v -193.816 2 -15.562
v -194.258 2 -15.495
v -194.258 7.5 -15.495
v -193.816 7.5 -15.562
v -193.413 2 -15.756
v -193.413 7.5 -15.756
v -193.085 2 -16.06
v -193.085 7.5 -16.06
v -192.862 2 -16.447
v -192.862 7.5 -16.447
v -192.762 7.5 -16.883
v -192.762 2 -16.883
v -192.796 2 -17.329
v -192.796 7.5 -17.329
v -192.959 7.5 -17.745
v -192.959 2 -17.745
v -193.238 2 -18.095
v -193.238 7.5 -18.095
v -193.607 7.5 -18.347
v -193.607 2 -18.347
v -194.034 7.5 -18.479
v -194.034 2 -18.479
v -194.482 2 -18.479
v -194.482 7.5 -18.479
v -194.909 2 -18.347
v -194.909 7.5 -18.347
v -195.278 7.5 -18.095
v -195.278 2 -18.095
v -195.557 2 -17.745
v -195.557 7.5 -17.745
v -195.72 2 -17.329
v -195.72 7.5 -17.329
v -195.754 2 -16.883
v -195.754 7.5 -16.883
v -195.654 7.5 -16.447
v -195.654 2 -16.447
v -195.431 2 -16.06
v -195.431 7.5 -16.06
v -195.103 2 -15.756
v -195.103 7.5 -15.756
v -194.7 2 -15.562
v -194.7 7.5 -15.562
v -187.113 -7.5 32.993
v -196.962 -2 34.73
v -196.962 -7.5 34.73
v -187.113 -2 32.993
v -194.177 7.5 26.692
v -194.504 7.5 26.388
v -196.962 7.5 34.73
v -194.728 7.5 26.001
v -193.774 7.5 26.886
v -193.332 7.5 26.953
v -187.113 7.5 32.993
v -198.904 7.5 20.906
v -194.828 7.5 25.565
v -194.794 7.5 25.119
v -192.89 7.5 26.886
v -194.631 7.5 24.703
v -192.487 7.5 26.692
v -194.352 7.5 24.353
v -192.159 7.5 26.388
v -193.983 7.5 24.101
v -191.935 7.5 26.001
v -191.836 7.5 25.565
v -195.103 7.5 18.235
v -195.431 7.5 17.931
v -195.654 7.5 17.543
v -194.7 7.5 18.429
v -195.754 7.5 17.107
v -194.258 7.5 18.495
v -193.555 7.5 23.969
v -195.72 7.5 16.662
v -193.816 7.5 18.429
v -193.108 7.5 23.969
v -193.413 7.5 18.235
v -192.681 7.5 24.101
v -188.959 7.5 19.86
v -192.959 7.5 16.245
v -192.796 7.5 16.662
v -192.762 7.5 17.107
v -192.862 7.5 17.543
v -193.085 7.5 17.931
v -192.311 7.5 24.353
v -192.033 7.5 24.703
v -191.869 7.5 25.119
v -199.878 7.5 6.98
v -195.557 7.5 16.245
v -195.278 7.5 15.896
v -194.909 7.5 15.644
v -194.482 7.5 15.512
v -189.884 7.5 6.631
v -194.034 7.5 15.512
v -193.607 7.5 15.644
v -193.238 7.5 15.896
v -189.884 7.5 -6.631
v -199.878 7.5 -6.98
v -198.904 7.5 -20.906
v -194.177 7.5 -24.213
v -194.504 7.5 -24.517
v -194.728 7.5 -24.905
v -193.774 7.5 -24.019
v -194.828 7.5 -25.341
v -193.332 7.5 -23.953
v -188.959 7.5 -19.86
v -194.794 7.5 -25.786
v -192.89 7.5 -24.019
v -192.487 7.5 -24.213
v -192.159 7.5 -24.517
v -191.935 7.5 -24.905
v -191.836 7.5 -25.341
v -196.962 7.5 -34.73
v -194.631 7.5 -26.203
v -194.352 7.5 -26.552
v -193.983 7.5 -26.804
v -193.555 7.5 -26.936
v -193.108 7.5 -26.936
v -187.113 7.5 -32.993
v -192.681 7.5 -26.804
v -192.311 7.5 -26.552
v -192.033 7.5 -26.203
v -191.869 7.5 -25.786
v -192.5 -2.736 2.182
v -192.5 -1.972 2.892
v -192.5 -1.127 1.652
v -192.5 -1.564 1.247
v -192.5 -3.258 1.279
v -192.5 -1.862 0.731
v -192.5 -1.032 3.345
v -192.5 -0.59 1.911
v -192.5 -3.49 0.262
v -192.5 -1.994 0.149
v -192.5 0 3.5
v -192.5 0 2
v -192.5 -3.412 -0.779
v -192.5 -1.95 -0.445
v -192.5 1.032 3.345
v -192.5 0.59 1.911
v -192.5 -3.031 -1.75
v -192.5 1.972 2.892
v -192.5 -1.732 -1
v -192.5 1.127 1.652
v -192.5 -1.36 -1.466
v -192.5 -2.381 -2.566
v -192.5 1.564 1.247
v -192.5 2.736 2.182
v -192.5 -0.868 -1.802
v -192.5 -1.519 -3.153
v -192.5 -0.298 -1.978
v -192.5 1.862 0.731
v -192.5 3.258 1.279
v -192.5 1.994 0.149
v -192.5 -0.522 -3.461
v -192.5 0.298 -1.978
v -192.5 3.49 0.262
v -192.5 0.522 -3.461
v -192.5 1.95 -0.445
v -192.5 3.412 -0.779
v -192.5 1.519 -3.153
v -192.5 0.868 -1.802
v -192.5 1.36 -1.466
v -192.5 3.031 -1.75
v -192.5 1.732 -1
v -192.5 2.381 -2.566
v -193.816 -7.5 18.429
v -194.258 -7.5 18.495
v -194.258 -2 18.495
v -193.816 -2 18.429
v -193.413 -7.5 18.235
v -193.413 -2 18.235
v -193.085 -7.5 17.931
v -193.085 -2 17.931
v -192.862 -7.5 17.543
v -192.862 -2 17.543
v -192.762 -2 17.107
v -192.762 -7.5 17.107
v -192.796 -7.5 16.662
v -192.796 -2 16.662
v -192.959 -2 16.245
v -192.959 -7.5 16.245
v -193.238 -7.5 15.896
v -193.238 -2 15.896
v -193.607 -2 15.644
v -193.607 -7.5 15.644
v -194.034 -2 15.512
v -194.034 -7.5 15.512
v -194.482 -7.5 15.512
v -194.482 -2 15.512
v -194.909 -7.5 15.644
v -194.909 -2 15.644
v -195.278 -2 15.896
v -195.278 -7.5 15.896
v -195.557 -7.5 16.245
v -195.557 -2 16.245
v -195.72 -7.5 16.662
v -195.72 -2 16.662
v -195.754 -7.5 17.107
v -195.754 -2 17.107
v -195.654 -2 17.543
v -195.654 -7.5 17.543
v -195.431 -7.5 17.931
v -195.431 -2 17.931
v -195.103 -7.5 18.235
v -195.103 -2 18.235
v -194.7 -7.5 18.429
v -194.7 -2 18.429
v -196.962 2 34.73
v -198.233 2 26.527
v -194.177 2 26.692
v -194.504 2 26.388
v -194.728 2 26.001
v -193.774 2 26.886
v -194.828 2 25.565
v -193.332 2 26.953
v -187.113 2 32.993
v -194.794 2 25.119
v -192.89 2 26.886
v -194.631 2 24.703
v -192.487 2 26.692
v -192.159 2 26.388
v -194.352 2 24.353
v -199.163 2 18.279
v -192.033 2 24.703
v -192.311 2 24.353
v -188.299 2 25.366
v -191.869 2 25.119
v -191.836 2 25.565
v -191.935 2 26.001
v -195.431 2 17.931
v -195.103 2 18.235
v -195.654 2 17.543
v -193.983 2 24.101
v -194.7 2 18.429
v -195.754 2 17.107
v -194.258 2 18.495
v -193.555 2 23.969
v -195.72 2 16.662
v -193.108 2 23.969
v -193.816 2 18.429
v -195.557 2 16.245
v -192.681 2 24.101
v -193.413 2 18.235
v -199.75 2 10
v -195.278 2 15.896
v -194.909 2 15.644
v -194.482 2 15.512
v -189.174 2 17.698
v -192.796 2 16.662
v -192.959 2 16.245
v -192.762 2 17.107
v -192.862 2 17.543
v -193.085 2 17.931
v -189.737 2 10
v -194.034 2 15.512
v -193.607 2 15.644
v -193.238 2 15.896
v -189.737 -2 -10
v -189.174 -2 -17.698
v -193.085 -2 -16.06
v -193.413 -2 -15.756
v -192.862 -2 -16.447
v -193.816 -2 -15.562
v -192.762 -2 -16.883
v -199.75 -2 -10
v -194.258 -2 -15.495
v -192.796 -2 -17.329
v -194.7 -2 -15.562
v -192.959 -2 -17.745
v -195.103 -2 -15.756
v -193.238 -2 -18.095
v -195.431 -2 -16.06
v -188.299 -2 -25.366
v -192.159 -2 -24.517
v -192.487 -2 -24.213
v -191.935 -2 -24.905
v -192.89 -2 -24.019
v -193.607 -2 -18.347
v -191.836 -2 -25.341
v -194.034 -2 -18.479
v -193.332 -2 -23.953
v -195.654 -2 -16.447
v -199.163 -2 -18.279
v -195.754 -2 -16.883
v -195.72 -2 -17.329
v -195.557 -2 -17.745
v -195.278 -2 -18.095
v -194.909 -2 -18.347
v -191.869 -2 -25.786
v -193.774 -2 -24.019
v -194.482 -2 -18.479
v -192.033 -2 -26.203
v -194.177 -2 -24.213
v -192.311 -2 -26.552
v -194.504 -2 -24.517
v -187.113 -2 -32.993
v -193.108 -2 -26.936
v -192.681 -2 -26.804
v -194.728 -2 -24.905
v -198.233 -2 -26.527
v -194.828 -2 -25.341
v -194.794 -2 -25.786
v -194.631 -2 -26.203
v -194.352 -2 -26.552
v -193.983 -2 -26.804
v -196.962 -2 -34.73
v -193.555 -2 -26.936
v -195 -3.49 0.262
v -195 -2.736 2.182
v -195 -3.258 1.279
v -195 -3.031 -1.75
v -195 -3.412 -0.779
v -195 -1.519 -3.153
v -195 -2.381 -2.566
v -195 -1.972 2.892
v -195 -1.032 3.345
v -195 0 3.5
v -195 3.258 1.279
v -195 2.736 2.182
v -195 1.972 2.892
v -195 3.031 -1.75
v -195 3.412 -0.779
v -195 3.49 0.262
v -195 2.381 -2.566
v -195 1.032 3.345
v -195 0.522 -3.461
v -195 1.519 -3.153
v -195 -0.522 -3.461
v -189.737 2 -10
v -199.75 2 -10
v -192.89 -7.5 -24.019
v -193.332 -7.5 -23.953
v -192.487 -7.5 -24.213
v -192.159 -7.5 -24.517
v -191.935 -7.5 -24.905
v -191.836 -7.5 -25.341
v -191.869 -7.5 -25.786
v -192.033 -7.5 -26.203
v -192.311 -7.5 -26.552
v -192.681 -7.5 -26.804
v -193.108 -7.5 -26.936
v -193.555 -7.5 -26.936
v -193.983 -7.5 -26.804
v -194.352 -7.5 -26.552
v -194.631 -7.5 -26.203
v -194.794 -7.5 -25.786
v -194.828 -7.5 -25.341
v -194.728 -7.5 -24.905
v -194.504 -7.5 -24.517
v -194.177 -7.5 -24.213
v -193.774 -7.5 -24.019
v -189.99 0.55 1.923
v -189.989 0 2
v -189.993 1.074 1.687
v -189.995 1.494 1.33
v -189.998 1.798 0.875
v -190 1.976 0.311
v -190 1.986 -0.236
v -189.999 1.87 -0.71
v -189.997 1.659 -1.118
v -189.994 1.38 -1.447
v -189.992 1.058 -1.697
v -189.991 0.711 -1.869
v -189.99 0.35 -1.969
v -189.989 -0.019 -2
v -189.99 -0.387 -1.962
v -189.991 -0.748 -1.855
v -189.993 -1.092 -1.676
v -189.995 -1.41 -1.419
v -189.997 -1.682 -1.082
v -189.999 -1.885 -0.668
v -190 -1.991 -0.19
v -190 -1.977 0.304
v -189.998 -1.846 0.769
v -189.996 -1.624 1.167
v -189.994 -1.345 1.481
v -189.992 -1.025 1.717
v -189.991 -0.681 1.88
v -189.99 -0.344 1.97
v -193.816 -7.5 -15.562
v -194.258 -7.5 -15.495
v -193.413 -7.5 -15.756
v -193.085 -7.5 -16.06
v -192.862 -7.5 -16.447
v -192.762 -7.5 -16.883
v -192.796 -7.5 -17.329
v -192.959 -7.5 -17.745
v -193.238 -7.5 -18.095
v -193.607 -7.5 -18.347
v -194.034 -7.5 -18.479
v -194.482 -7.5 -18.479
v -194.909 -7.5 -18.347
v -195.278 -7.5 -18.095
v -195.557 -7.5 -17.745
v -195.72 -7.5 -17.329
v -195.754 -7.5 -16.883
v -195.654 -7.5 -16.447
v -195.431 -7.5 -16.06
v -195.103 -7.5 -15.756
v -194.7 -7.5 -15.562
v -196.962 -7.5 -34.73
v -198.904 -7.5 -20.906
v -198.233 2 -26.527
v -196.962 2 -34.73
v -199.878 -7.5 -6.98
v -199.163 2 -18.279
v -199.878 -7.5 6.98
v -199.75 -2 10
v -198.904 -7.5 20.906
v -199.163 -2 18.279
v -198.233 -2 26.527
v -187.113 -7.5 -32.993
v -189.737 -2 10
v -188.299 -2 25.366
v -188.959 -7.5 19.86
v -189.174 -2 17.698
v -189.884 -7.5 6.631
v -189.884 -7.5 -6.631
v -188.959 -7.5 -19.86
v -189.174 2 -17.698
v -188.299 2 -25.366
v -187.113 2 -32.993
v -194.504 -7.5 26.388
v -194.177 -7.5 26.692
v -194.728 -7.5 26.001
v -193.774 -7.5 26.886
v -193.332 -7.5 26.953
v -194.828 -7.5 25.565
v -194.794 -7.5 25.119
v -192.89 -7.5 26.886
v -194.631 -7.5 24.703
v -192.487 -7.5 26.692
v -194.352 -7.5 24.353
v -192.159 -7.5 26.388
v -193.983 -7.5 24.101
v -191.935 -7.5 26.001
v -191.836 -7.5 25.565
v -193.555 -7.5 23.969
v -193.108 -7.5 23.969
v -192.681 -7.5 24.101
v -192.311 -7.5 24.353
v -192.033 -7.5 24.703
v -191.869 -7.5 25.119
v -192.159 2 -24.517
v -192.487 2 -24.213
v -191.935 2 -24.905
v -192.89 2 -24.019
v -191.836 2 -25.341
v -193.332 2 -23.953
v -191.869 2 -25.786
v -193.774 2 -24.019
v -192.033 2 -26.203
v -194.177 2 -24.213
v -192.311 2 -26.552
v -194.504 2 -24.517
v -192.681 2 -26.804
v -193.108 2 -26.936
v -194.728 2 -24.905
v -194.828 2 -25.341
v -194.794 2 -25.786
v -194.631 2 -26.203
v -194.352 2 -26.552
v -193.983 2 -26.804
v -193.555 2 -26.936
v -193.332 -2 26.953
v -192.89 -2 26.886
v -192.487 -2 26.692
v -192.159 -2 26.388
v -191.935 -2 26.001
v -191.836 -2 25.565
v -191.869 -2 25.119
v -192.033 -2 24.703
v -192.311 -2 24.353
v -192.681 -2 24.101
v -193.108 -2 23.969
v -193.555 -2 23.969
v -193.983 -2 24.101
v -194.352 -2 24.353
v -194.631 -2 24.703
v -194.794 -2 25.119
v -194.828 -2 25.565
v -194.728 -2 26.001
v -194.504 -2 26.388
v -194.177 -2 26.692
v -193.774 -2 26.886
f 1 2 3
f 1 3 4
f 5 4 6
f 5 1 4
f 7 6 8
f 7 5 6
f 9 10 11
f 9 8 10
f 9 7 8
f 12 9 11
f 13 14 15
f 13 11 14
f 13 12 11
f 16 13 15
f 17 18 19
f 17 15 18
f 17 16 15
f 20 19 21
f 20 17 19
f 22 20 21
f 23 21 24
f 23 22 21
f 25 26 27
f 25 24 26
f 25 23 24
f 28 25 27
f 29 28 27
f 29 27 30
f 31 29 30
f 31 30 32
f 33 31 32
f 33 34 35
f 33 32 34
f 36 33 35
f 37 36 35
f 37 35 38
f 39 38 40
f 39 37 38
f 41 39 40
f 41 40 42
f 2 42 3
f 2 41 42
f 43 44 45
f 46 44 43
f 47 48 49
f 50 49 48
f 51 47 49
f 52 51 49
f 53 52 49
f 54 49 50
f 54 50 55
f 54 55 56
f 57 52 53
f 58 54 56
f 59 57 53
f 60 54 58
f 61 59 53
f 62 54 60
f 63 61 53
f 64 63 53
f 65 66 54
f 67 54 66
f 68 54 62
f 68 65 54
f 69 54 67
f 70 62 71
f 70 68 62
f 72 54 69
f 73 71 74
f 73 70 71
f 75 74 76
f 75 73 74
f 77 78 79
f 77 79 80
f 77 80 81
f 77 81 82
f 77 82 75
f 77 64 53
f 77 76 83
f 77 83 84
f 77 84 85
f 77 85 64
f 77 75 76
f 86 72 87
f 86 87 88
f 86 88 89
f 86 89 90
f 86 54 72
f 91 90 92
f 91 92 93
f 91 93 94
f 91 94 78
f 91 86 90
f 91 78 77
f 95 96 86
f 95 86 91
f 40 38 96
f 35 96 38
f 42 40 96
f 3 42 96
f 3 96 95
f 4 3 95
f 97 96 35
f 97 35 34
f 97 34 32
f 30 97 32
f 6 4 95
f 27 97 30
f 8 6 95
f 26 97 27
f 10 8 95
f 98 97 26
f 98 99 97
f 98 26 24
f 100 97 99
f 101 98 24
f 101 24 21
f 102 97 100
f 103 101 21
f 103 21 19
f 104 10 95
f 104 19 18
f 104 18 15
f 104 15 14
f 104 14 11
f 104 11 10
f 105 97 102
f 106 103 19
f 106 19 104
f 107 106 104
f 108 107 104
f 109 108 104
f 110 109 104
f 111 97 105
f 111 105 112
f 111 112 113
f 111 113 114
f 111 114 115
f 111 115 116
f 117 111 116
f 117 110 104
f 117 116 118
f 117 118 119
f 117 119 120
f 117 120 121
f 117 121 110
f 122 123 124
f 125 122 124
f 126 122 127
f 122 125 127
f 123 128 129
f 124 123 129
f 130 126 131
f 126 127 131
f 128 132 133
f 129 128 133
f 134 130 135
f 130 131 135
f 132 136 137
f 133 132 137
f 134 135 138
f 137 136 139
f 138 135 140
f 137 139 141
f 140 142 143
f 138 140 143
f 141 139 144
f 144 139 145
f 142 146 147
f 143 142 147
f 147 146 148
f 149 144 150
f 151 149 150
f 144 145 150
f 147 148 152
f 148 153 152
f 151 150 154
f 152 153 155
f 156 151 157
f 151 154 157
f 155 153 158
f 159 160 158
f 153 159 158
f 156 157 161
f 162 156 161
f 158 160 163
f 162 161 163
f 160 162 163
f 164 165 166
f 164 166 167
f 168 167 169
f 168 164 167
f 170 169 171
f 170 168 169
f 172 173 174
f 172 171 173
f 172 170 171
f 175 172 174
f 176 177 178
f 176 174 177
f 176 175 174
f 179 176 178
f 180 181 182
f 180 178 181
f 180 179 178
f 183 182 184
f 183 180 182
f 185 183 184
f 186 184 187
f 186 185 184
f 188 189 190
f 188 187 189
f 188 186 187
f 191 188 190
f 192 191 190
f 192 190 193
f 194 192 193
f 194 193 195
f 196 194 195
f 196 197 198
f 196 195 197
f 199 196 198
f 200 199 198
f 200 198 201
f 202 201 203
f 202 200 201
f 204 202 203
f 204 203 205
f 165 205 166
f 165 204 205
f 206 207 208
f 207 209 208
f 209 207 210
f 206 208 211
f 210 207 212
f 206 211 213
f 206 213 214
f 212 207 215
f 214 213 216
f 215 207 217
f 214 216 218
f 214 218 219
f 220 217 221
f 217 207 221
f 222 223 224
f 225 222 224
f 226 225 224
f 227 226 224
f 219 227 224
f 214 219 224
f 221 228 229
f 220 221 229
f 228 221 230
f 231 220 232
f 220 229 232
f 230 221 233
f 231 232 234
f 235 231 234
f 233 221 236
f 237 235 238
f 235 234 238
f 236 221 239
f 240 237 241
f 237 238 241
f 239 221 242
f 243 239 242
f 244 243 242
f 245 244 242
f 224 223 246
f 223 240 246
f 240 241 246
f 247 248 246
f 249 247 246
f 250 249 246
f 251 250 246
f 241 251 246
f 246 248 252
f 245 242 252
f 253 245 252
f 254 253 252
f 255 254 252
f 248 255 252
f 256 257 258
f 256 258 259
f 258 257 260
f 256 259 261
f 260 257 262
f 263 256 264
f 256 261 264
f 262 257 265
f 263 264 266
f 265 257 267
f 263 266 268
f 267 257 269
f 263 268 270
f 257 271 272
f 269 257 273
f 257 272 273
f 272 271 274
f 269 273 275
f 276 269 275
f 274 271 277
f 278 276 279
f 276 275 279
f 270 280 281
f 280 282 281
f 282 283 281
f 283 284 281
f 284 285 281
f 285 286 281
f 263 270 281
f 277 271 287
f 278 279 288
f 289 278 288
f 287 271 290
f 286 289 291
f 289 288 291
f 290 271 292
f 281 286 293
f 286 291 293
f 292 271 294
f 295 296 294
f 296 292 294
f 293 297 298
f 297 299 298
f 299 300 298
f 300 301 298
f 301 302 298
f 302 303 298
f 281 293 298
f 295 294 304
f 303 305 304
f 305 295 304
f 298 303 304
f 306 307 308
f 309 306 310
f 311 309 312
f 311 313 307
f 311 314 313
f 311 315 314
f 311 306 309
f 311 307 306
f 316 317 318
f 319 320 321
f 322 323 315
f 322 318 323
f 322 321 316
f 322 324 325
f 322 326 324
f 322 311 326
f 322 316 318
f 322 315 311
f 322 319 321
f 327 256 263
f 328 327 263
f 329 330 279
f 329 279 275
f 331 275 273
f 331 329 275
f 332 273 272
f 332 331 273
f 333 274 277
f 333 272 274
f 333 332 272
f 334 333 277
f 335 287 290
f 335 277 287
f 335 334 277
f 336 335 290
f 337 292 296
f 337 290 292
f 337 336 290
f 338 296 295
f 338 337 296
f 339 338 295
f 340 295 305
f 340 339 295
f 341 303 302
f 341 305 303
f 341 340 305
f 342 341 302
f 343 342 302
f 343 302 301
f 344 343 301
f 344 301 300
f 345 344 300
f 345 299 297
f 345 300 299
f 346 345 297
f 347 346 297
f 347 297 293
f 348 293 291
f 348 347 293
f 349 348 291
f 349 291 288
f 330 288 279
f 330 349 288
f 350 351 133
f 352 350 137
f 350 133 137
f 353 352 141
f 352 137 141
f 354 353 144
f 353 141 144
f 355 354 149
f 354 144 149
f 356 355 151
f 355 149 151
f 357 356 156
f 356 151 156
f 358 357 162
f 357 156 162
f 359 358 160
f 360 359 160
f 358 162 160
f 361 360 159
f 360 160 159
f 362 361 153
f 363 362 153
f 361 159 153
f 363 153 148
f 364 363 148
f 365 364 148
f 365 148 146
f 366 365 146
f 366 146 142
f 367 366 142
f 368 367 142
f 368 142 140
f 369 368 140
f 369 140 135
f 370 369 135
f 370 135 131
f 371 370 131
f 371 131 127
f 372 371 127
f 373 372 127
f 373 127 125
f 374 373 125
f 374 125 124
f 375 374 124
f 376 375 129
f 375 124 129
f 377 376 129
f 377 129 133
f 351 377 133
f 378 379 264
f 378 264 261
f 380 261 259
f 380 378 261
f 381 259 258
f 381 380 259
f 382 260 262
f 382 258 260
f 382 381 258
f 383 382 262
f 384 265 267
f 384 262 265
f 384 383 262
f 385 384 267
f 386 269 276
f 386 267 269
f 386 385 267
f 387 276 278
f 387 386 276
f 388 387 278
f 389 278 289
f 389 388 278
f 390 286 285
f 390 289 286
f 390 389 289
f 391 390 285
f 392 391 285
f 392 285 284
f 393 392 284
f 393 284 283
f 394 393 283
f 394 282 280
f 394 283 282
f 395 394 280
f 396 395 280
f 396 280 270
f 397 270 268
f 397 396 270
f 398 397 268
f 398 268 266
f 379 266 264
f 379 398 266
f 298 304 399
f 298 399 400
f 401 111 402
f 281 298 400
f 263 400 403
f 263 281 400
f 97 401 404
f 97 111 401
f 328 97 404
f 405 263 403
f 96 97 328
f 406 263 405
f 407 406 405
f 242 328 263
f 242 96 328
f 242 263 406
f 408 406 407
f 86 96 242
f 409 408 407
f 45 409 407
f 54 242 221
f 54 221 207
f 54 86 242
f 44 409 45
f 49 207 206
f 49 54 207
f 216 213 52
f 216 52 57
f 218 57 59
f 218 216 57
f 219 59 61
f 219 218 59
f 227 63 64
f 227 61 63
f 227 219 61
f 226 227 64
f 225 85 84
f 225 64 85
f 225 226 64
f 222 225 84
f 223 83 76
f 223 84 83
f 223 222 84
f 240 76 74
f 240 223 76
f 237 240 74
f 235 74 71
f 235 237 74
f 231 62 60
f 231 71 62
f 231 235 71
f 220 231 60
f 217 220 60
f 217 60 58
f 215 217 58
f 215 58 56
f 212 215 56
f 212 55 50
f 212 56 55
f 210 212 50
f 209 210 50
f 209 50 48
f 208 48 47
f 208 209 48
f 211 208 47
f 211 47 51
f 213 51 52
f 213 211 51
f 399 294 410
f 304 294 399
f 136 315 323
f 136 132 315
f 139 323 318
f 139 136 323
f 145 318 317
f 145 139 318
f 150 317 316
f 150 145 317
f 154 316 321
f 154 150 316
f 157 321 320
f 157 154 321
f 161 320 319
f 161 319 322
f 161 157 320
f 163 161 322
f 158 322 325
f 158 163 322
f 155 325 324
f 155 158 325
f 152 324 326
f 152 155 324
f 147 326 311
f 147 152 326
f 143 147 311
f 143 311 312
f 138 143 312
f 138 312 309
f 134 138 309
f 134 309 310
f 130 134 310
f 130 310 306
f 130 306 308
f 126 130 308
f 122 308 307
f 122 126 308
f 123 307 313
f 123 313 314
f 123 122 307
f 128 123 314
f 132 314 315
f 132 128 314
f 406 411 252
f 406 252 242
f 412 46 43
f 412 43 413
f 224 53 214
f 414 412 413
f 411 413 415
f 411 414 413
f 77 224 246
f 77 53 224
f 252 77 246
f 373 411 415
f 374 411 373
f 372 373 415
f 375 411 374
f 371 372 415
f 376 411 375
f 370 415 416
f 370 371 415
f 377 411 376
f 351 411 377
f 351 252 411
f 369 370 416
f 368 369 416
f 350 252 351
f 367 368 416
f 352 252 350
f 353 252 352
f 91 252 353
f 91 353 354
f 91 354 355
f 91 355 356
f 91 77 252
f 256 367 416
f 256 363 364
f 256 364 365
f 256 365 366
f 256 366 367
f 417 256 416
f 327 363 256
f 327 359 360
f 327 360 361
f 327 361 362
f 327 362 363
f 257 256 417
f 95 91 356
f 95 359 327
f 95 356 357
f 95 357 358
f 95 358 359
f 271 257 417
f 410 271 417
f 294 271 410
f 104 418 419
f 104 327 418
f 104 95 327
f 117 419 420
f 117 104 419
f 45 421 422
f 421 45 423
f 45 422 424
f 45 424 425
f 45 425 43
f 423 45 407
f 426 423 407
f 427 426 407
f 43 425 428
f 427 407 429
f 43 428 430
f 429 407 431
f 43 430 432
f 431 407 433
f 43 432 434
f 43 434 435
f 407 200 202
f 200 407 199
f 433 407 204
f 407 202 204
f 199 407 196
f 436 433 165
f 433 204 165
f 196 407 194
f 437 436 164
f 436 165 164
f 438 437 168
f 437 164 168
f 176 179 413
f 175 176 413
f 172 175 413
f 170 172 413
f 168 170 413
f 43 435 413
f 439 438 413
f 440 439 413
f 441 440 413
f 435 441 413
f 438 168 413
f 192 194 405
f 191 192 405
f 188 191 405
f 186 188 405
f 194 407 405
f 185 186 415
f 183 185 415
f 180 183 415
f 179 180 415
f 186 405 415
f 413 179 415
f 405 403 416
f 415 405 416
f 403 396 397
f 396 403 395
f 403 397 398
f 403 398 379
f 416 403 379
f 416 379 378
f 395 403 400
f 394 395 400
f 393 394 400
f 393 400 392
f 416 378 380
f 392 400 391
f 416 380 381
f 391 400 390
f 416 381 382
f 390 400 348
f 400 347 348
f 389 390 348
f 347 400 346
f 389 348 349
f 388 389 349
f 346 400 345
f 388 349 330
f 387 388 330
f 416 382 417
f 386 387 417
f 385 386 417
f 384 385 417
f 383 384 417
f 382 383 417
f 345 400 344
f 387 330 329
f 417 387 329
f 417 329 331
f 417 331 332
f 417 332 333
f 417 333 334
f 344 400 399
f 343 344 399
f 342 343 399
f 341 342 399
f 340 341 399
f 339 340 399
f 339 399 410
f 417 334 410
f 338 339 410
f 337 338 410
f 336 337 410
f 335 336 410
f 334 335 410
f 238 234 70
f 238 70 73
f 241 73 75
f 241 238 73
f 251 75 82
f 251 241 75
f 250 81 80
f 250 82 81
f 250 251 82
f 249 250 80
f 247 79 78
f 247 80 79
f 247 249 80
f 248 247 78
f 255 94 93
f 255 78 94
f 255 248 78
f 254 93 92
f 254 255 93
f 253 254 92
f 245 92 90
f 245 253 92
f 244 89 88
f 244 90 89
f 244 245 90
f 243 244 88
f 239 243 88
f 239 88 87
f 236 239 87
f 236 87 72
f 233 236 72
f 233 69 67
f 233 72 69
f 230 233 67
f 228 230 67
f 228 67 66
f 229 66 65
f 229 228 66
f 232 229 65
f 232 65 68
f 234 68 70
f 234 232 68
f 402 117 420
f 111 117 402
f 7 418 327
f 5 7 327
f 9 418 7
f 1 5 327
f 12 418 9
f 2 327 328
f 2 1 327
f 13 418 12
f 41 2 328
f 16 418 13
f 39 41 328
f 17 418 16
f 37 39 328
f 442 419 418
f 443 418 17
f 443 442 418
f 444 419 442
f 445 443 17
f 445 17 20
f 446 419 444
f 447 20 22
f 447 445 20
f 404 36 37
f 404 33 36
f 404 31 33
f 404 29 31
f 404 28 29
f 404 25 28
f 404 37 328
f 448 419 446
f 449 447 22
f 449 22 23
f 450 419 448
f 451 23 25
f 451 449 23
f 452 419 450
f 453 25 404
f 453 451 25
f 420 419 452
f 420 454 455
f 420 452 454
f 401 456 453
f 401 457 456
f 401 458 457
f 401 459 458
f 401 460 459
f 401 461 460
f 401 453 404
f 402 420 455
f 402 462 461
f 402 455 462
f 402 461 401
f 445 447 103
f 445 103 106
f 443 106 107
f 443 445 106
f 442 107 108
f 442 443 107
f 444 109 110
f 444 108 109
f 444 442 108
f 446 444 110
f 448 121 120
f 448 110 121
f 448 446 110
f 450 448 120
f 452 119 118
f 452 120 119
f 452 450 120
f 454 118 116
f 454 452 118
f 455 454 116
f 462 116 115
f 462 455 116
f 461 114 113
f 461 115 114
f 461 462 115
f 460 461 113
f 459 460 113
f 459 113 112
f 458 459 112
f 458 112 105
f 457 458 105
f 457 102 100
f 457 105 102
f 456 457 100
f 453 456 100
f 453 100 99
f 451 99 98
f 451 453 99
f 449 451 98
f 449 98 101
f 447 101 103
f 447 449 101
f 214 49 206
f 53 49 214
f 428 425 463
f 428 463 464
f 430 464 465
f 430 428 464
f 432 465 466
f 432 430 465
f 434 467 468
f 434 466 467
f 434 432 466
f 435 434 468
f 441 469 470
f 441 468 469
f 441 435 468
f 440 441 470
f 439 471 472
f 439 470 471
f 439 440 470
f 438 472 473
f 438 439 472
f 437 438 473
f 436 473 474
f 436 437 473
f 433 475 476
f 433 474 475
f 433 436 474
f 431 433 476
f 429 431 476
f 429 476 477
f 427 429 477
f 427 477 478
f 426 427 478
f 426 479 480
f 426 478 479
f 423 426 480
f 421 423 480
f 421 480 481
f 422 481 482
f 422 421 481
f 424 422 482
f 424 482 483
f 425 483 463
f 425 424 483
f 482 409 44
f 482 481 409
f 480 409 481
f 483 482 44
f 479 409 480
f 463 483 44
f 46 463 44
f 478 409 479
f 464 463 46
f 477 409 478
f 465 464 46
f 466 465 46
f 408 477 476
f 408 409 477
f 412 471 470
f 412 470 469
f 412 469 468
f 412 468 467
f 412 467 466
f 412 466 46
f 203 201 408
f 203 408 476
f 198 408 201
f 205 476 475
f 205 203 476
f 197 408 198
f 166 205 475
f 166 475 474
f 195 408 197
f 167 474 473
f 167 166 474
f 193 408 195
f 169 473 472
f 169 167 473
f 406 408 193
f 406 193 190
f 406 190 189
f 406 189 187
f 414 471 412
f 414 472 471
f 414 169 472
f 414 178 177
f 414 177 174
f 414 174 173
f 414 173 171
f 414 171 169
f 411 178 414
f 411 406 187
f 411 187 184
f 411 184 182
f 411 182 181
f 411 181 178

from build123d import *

# Parameters (mm, degrees)
BASE_DEPTH            = 7.5
MOUNT_START           = -2
MOUNT_DEPTH           = 4
MOUNT_HOLE_DEPTH      = 204.131478566
MOUNT_HOLE_DEPTH_BACK = 204.131478566
SKETCH12_R            = 1.5
SKETCH14_R            = 2
SHAFT_HOLE_DEPTH      = 37.394984425
SKETCH13_W            = 2.5
SKETCH13_H            = 3.5


with BuildPart() as part:
    # Sketch9 → base (new, symmetric)
    with BuildSketch(Plane(origin=(0, 0, 0), x_dir=(1, 0, 0), z_dir=(0, 1, 0))):
        with BuildLine():
            ThreePointArc((-187.113473072, -32.993153757), (-190, 0), (-187.113473072, 32.993153757))
            Line((-187.113473072, 32.993153757), (-196.961550602, 34.729635533))
            ThreePointArc((-196.961550602, 34.729635533), (-200, 0), (-196.961550602, -34.729635533))
            Line((-196.961550602, -34.729635533), (-187.113473072, -32.993153757))
        make_face()
    extrude(amount=BASE_DEPTH, both=True)

    # Sketch11 → mount (cut)
    with BuildSketch(Plane(origin=(0, 0, 0), x_dir=(1, 0, 0), z_dir=(0, 1, 0)).offset(MOUNT_START)):
        with BuildLine():
            Line((-189.73665961, -10), (-199.749843554, -10))
            ThreePointArc((-199.749843554, -10), (-198.7407137, -22.408228804), (-196.961550602, -34.729635533))
            Line((-196.961550602, -34.729635533), (-187.113473072, -32.993153757))
            ThreePointArc((-187.113473072, -32.993153757), (-188.775466906, -21.536552519), (-189.73665961, -10))
        make_face()
        with BuildLine():
            Line((-189.73665961, 10), (-199.749843554, 10))
            ThreePointArc((-199.749843554, 10), (-198.7407137, 22.408228804), (-196.961550602, 34.729635533))
            Line((-196.961550602, 34.729635533), (-187.113473072, 32.993153757))
            ThreePointArc((-187.113473072, 32.993153757), (-188.775466906, 21.536552519), (-189.73665961, 10))
        make_face()
    extrude(amount=MOUNT_DEPTH, mode=Mode.SUBTRACT)

    # Sketch12 → mount hole (cut, two sides: drawn at the far end of the back side and taken through both)
    with BuildSketch(Plane(origin=(0, 0, 0), x_dir=(1, 0, 0), z_dir=(0, 1, 0)).offset(-MOUNT_HOLE_DEPTH_BACK)):
        with Locations(Location((-193.331747968, 25.452607483, 0), (0, 0, 270))):
            Circle(SKETCH12_R)
        with Locations(Location((-194.257966128, 16.995369836, 0), (0, 0, 270))):
            Circle(SKETCH12_R)
        with Locations(Location((-194.257966128, -16.995369836, 0), (0, 0, 270))):
            Circle(SKETCH12_R)
        with Locations(Location((-193.331747968, -25.452607483, 0), (0, 0, 270))):
            Circle(SKETCH12_R)
    extrude(amount=MOUNT_HOLE_DEPTH + MOUNT_HOLE_DEPTH_BACK, mode=Mode.SUBTRACT)

    # Sketch14 → shaft hole (cut, through all)
    with BuildSketch(Plane.ZY.offset(195)):
        Circle(SKETCH14_R)
    extrude(amount=-SHAFT_HOLE_DEPTH, mode=Mode.SUBTRACT)

    # Sketch13 → Cut-Revolve1 (revolve, cut)
    with BuildSketch(Plane(origin=(0, 0, 0), x_dir=(1, 0, 0), z_dir=(0, 1, 0)), mode=Mode.PRIVATE) as cut_revolve1_sk:
        with Locations((-193.75, 1.75)):
            Rectangle(SKETCH13_W, SKETCH13_H)
    revolve(cut_revolve1_sk.sketch.rotate(Axis((0, 0, 0), (-1, 0, 0)), 180), axis=Axis((0, 0, 0), (-1, 0, 0)), mode=Mode.SUBTRACT)


solid = part.part
